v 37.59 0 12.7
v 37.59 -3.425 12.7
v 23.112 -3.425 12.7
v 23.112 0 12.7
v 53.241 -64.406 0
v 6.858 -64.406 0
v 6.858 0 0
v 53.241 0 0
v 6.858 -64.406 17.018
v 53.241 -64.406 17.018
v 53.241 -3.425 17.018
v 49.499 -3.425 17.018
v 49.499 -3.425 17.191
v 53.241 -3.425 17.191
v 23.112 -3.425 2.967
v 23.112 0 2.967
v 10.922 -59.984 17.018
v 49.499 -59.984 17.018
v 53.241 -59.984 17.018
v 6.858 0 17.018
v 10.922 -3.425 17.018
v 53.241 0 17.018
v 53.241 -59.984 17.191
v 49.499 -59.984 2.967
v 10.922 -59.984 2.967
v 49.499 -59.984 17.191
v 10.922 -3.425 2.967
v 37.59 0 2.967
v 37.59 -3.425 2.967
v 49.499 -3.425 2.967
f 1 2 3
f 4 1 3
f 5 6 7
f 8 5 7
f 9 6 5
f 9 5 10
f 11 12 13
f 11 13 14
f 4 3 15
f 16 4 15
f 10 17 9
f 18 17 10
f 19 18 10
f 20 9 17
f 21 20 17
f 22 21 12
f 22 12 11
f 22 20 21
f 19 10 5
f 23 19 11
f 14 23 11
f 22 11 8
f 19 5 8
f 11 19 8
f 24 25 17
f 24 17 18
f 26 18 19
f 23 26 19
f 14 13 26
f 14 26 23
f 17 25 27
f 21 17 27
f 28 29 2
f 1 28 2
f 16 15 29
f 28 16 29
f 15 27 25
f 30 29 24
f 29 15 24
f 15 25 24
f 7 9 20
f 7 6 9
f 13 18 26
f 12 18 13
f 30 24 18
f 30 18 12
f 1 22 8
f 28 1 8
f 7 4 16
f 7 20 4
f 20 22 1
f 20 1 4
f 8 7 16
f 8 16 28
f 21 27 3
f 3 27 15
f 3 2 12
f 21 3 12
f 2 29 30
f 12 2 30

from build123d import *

# Parameters (mm, degrees)
F0_W      = 61.1153431237
F0_H      = 64.4062012434
F0_W_2    = 55.2647679579
F0_H_2    = 56.5587065648
F1_DEPTH  = 12.7
F2_W      = 55.2647679579
F2_H      = 2.967182314
F3_DEPTH  = 56.896
F5_DEPTH  = 4.318
F6_DEPTH  = 25.4
F7_DEPTH  = 7.874
F8_W      = 3.7420586476
F8_H      = 56.5587065648
F9_DEPTH  = 14.224
F10_DEPTH = 10.922
F11_DEPTH = 6.858


with BuildPart() as f1:
    # F0 (on Top) → F1 (new body)
    with BuildSketch(Plane.XY):
        with Locations((30.5576715618, -32.2031006217)):
            Rectangle(F0_W, F0_H)
        with Locations((30.3483285243, -31.7048091674)):
            Rectangle(F0_W_2, F0_H_2, mode=Mode.SUBTRACT)
    extrude(amount=F1_DEPTH)

    # F2 (on face) → F3 (join)
    with BuildSketch(Plane.XZ.offset(3.425455885)):
        with Locations((30.3483285243, 1.483591157)):
            Rectangle(F2_W, F2_H)
    extrude(amount=F3_DEPTH)

    # F5 (add): a face of the model
    f5_faces = [f1.faces().sort_by_distance(p)[0] for p in [
        (30.5576715618, -0.8878763384, 12.7),
    ]]
    extrude(f5_faces, amount=F5_DEPTH)

    # F4 (on face) → F6 (cut)
    with BuildSketch(Plane.XZ.offset(3.425455885)):
        Polygon((37.590354681, 7.833591157), (37.590354681, 12.7), (30.3483285243, 12.7), (23.1118518859, 12.7), (23.1118518859, 7.833591157), (23.1118518859, 2.967182314), (30.3483285243, 2.967182314), (37.590354681, 2.967182314), align=None)
    extrude(amount=-F6_DEPTH, mode=Mode.SUBTRACT)

    # F7 (cut): a face of the model
    f7_faces = [f1.faces().sort_by_distance(p)[0] for p in [
        (61.1153431237, -32.2031006217, 8.509),
    ]]
    extrude(f7_faces, amount=-F7_DEPTH, mode=Mode.SUBTRACT)

    # F8 (on face) → F9 (join)
    with BuildSketch(Plane.XY.offset(2.967182314)):
        with Locations((51.3703137999, -31.7048091674)):
            Rectangle(F8_W, F8_H)
    extrude(amount=F9_DEPTH)

    # F10 (add): a face of the model
    f10_faces = [f1.faces().sort_by_distance(p)[0] for p in [
        (0, -32.2031006217, 8.509),
    ]]
    extrude(f10_faces, amount=-F10_DEPTH)

    # F11 (cut): a face of the model
    f11_faces = [f1.faces().sort_by_distance(p)[0] for p in [
        (0, -32.2031006217, 8.509),
    ]]
    extrude(f11_faces, amount=-F11_DEPTH, mode=Mode.SUBTRACT)


solid = f1.part
